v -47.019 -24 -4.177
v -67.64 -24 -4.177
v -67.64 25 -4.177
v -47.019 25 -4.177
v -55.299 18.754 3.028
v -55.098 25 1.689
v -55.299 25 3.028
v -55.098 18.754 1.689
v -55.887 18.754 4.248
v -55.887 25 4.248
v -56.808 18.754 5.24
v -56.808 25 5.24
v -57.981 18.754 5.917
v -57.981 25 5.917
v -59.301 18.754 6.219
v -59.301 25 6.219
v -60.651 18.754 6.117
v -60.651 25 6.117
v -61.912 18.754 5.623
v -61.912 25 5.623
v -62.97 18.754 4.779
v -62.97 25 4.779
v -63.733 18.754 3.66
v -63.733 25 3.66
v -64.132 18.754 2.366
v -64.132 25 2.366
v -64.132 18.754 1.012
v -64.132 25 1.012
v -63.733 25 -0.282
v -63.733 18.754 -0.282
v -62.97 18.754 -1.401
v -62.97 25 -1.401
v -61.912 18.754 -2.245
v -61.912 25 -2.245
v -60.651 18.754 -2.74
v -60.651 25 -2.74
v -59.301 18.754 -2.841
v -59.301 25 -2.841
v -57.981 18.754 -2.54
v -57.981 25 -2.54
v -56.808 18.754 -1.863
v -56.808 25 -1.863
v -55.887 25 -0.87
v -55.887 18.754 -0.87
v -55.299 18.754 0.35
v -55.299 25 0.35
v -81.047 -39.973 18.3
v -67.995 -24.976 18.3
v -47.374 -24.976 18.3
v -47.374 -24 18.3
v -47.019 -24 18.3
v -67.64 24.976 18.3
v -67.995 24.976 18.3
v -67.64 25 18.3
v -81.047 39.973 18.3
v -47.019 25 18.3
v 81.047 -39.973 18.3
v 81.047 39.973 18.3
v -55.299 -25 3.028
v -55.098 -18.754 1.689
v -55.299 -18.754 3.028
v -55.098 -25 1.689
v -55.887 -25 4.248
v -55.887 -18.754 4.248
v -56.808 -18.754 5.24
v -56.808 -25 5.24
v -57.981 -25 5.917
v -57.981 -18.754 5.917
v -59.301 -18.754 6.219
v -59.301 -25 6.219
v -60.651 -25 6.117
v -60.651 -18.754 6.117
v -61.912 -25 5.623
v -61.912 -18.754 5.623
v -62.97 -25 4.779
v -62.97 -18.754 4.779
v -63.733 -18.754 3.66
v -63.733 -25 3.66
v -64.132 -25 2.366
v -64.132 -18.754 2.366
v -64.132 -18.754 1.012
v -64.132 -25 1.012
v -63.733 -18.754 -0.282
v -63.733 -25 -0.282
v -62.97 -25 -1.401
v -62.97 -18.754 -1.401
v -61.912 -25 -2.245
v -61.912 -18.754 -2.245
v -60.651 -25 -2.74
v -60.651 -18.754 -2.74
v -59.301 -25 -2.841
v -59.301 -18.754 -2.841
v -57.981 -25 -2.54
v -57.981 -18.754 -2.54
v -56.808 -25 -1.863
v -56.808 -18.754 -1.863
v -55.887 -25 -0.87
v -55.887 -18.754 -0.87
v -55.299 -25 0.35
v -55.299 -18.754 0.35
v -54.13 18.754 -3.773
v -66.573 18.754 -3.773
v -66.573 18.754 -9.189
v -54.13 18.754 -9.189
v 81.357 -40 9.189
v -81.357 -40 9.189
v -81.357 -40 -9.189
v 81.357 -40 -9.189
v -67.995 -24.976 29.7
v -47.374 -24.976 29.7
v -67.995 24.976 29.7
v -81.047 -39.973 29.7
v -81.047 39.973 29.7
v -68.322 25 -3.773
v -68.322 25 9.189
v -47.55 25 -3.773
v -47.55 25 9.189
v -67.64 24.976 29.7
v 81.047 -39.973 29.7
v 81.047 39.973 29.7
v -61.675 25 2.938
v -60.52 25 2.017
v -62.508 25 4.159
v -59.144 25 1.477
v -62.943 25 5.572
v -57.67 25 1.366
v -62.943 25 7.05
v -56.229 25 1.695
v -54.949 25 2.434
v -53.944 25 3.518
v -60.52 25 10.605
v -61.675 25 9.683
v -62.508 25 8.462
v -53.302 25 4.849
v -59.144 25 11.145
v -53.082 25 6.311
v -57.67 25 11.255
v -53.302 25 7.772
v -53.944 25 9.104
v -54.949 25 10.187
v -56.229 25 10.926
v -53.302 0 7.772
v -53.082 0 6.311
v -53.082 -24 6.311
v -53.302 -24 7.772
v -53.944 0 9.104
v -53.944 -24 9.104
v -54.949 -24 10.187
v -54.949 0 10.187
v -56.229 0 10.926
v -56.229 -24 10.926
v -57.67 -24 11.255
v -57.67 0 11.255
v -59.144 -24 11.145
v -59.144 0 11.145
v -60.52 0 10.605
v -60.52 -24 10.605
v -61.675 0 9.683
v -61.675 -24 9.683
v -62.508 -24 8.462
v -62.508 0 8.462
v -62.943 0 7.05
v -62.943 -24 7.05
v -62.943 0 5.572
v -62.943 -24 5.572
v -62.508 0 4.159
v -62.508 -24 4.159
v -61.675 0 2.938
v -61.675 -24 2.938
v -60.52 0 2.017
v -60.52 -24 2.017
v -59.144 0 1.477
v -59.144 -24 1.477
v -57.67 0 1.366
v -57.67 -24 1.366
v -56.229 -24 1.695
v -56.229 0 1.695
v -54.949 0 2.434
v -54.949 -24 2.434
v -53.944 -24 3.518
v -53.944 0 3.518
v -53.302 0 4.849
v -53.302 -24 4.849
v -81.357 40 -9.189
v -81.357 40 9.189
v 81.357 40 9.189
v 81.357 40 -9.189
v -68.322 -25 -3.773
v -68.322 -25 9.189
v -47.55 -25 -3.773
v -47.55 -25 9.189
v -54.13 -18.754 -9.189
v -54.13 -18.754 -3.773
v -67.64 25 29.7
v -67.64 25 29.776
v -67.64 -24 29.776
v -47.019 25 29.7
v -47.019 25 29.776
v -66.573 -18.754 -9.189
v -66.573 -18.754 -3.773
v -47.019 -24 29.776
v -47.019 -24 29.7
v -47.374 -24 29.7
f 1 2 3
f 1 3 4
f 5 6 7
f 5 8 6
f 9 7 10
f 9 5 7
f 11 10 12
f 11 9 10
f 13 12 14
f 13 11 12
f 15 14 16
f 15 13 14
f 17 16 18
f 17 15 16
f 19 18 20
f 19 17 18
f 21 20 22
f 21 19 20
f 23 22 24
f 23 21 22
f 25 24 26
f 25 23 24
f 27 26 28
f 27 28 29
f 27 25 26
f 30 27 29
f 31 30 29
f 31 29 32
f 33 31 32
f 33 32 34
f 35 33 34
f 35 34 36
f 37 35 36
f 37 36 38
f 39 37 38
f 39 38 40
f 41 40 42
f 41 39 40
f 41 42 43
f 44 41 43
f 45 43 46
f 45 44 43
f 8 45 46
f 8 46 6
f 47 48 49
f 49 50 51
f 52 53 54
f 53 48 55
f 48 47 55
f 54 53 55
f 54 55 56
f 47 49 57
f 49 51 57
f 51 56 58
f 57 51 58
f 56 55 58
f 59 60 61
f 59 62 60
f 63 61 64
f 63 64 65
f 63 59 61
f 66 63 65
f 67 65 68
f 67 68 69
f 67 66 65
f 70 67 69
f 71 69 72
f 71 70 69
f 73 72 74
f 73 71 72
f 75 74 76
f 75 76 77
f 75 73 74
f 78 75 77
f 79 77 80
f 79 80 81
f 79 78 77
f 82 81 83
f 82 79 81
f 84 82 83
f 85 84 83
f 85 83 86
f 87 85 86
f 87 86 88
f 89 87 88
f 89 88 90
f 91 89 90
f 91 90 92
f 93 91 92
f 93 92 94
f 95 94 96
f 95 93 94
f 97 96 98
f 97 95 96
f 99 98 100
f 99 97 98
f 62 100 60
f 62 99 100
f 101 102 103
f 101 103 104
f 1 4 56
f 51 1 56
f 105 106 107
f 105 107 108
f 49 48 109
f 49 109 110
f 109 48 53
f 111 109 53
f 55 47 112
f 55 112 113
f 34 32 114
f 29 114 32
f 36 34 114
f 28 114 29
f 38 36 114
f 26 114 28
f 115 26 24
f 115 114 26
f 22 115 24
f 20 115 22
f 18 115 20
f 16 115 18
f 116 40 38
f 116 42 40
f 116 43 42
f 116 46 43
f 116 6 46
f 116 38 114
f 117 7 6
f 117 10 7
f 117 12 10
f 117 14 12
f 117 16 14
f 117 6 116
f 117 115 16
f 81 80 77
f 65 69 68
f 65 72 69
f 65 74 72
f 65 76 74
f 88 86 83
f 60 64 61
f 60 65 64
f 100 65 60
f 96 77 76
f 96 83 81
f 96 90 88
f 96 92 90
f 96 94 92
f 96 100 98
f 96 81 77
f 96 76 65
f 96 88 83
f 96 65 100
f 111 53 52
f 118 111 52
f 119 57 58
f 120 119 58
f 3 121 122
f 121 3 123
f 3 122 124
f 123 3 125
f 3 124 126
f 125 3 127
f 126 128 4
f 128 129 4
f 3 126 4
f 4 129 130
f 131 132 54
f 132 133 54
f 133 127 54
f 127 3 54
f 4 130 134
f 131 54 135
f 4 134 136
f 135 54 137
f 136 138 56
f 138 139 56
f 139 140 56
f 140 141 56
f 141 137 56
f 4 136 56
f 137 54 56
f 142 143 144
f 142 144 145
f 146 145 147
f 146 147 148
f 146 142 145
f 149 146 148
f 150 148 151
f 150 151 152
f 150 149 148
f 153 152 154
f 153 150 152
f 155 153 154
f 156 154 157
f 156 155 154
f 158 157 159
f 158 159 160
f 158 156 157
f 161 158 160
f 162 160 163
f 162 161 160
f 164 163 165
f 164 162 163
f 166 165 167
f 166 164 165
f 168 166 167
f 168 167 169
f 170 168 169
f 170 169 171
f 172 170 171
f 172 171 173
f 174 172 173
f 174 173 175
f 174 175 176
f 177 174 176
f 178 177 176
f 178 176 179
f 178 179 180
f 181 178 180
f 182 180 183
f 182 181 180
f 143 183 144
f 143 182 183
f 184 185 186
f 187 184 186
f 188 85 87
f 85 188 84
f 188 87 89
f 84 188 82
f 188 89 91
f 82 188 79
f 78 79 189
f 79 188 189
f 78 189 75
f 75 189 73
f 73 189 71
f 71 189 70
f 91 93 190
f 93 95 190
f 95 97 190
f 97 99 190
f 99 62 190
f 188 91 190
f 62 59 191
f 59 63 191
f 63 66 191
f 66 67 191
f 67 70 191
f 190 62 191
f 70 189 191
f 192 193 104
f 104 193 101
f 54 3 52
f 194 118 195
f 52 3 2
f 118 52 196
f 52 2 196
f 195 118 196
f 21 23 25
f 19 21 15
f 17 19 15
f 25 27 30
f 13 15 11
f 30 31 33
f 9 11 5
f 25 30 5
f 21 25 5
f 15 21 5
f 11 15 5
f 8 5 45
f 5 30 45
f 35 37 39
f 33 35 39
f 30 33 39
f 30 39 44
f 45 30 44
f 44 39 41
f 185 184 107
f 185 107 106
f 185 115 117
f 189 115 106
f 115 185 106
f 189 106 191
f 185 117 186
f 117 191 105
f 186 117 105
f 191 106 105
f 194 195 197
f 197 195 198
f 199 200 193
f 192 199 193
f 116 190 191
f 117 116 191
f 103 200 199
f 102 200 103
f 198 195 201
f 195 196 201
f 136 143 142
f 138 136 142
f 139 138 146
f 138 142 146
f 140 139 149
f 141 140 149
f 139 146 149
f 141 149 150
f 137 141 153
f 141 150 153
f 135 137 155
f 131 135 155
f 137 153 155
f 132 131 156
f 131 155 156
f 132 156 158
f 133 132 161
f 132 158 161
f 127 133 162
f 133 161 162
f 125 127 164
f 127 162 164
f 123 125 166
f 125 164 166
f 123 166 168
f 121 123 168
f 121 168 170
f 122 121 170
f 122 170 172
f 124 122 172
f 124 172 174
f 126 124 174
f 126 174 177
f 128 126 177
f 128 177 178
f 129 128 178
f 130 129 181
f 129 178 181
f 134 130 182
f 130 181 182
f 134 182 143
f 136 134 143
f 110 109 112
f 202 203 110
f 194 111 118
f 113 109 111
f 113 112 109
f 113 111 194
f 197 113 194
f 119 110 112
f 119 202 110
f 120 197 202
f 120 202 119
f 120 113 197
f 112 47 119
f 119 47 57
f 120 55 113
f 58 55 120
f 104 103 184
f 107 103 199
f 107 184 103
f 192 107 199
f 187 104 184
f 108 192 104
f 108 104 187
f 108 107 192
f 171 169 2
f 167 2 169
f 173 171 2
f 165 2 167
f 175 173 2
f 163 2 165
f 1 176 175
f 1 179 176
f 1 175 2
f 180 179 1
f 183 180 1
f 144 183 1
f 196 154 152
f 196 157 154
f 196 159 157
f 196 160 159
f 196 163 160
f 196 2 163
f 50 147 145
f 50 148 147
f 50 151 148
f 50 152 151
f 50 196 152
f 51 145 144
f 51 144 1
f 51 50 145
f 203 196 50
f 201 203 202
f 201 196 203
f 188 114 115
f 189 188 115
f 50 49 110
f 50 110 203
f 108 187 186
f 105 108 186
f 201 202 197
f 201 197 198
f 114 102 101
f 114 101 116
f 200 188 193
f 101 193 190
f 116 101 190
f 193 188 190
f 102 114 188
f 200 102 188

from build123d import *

# Parameters (mm, degrees)
F0_W           = 162.7134084702
F0_H           = 18.3784328401
F1_DEPTH       = 40
F1_DEPTH_BACK  = 40
F2_W           = 20.7726098597
F2_H           = 20.496037323
F3_DEPTH       = 25
F3_DEPTH_BACK  = 25
F4_R           = 4.5425898753
F5_DEPTH       = 25
F5_DEPTH_BACK  = 25
F6_W           = 12.4435722828
F6_H           = 37.5084653497
F7_DEPTH       = 25
F7_DEPTH_BACK  = 25
F9_W           = 162.0947122574
F9_H           = 79.9454376101
F9_W_2         = 20.6207633018
F9_H_2         = 49.9520339072
F10_DEPTH      = 11.4
F11_W          = 20.6207707524
F11_H          = 33.9531623758
F11_R          = 4.9583436457
F12_DEPTH      = 24
F12_DEPTH_BACK = 25


with BuildPart() as f1:
    # F0 (on Front) → F1 (new body, two sides)
    with BuildSketch(Plane.XZ) as f1_sk:
        Rectangle(F0_W, F0_H)
    extrude(amount=F1_DEPTH)
    extrude(f1_sk.sketch, amount=-F1_DEPTH_BACK)

    # F2 (on Front) → F3 (cut, two sides)
    with BuildSketch(Plane.XZ) as f3_sk:
        with Locations((-57.9359661788, 6.4746418502)):
            Rectangle(F2_W, F2_H)
    extrude(amount=-F3_DEPTH, mode=Mode.SUBTRACT)
    extrude(f3_sk.sketch, amount=F3_DEPTH_BACK, mode=Mode.SUBTRACT)

    # F4 (on Front) → F5 (join, two sides)
    with BuildSketch(Plane.XZ) as f5_sk:
        with Locations((-59.6402399242, 1.6887697857)):
            Circle(F4_R)
    extrude(amount=F5_DEPTH)
    extrude(f5_sk.sketch, amount=-F5_DEPTH_BACK)

    # F6 (on Top) → F7 (cut, two sides)
    with BuildSketch(Plane.XY) as f7_sk:
        with Locations((-60.3513009846, 0)):
            Rectangle(F6_W, F6_H)
    extrude(amount=-F7_DEPTH, mode=Mode.SUBTRACT)
    extrude(f7_sk.sketch, amount=F7_DEPTH_BACK, mode=Mode.SUBTRACT)


with BuildPart() as f10:
    # F9 (on offset) → F10 (new body)
    with BuildSketch(Plane.XY.offset(18.3)):
        Rectangle(F9_W, F9_H)
        with Locations((-57.6848201454, 0)):
            Rectangle(F9_W_2, F9_H_2, mode=Mode.SUBTRACT)
    extrude(amount=F10_DEPTH)

    # F11 (on Front) → F12 (join, two sides)
    with BuildSketch(Plane.XZ) as f12_sk:
        with Locations((-57.3292933404, 12.7990979236)):
            Rectangle(F11_W, F11_H)
        with Locations((-58.0403506756, 6.3106664456)):
            Circle(F11_R, mode=Mode.SUBTRACT)
    extrude(amount=F12_DEPTH)
    extrude(f12_sk.sketch, amount=-F12_DEPTH_BACK)


solid = Compound([f1.part, f10.part])
